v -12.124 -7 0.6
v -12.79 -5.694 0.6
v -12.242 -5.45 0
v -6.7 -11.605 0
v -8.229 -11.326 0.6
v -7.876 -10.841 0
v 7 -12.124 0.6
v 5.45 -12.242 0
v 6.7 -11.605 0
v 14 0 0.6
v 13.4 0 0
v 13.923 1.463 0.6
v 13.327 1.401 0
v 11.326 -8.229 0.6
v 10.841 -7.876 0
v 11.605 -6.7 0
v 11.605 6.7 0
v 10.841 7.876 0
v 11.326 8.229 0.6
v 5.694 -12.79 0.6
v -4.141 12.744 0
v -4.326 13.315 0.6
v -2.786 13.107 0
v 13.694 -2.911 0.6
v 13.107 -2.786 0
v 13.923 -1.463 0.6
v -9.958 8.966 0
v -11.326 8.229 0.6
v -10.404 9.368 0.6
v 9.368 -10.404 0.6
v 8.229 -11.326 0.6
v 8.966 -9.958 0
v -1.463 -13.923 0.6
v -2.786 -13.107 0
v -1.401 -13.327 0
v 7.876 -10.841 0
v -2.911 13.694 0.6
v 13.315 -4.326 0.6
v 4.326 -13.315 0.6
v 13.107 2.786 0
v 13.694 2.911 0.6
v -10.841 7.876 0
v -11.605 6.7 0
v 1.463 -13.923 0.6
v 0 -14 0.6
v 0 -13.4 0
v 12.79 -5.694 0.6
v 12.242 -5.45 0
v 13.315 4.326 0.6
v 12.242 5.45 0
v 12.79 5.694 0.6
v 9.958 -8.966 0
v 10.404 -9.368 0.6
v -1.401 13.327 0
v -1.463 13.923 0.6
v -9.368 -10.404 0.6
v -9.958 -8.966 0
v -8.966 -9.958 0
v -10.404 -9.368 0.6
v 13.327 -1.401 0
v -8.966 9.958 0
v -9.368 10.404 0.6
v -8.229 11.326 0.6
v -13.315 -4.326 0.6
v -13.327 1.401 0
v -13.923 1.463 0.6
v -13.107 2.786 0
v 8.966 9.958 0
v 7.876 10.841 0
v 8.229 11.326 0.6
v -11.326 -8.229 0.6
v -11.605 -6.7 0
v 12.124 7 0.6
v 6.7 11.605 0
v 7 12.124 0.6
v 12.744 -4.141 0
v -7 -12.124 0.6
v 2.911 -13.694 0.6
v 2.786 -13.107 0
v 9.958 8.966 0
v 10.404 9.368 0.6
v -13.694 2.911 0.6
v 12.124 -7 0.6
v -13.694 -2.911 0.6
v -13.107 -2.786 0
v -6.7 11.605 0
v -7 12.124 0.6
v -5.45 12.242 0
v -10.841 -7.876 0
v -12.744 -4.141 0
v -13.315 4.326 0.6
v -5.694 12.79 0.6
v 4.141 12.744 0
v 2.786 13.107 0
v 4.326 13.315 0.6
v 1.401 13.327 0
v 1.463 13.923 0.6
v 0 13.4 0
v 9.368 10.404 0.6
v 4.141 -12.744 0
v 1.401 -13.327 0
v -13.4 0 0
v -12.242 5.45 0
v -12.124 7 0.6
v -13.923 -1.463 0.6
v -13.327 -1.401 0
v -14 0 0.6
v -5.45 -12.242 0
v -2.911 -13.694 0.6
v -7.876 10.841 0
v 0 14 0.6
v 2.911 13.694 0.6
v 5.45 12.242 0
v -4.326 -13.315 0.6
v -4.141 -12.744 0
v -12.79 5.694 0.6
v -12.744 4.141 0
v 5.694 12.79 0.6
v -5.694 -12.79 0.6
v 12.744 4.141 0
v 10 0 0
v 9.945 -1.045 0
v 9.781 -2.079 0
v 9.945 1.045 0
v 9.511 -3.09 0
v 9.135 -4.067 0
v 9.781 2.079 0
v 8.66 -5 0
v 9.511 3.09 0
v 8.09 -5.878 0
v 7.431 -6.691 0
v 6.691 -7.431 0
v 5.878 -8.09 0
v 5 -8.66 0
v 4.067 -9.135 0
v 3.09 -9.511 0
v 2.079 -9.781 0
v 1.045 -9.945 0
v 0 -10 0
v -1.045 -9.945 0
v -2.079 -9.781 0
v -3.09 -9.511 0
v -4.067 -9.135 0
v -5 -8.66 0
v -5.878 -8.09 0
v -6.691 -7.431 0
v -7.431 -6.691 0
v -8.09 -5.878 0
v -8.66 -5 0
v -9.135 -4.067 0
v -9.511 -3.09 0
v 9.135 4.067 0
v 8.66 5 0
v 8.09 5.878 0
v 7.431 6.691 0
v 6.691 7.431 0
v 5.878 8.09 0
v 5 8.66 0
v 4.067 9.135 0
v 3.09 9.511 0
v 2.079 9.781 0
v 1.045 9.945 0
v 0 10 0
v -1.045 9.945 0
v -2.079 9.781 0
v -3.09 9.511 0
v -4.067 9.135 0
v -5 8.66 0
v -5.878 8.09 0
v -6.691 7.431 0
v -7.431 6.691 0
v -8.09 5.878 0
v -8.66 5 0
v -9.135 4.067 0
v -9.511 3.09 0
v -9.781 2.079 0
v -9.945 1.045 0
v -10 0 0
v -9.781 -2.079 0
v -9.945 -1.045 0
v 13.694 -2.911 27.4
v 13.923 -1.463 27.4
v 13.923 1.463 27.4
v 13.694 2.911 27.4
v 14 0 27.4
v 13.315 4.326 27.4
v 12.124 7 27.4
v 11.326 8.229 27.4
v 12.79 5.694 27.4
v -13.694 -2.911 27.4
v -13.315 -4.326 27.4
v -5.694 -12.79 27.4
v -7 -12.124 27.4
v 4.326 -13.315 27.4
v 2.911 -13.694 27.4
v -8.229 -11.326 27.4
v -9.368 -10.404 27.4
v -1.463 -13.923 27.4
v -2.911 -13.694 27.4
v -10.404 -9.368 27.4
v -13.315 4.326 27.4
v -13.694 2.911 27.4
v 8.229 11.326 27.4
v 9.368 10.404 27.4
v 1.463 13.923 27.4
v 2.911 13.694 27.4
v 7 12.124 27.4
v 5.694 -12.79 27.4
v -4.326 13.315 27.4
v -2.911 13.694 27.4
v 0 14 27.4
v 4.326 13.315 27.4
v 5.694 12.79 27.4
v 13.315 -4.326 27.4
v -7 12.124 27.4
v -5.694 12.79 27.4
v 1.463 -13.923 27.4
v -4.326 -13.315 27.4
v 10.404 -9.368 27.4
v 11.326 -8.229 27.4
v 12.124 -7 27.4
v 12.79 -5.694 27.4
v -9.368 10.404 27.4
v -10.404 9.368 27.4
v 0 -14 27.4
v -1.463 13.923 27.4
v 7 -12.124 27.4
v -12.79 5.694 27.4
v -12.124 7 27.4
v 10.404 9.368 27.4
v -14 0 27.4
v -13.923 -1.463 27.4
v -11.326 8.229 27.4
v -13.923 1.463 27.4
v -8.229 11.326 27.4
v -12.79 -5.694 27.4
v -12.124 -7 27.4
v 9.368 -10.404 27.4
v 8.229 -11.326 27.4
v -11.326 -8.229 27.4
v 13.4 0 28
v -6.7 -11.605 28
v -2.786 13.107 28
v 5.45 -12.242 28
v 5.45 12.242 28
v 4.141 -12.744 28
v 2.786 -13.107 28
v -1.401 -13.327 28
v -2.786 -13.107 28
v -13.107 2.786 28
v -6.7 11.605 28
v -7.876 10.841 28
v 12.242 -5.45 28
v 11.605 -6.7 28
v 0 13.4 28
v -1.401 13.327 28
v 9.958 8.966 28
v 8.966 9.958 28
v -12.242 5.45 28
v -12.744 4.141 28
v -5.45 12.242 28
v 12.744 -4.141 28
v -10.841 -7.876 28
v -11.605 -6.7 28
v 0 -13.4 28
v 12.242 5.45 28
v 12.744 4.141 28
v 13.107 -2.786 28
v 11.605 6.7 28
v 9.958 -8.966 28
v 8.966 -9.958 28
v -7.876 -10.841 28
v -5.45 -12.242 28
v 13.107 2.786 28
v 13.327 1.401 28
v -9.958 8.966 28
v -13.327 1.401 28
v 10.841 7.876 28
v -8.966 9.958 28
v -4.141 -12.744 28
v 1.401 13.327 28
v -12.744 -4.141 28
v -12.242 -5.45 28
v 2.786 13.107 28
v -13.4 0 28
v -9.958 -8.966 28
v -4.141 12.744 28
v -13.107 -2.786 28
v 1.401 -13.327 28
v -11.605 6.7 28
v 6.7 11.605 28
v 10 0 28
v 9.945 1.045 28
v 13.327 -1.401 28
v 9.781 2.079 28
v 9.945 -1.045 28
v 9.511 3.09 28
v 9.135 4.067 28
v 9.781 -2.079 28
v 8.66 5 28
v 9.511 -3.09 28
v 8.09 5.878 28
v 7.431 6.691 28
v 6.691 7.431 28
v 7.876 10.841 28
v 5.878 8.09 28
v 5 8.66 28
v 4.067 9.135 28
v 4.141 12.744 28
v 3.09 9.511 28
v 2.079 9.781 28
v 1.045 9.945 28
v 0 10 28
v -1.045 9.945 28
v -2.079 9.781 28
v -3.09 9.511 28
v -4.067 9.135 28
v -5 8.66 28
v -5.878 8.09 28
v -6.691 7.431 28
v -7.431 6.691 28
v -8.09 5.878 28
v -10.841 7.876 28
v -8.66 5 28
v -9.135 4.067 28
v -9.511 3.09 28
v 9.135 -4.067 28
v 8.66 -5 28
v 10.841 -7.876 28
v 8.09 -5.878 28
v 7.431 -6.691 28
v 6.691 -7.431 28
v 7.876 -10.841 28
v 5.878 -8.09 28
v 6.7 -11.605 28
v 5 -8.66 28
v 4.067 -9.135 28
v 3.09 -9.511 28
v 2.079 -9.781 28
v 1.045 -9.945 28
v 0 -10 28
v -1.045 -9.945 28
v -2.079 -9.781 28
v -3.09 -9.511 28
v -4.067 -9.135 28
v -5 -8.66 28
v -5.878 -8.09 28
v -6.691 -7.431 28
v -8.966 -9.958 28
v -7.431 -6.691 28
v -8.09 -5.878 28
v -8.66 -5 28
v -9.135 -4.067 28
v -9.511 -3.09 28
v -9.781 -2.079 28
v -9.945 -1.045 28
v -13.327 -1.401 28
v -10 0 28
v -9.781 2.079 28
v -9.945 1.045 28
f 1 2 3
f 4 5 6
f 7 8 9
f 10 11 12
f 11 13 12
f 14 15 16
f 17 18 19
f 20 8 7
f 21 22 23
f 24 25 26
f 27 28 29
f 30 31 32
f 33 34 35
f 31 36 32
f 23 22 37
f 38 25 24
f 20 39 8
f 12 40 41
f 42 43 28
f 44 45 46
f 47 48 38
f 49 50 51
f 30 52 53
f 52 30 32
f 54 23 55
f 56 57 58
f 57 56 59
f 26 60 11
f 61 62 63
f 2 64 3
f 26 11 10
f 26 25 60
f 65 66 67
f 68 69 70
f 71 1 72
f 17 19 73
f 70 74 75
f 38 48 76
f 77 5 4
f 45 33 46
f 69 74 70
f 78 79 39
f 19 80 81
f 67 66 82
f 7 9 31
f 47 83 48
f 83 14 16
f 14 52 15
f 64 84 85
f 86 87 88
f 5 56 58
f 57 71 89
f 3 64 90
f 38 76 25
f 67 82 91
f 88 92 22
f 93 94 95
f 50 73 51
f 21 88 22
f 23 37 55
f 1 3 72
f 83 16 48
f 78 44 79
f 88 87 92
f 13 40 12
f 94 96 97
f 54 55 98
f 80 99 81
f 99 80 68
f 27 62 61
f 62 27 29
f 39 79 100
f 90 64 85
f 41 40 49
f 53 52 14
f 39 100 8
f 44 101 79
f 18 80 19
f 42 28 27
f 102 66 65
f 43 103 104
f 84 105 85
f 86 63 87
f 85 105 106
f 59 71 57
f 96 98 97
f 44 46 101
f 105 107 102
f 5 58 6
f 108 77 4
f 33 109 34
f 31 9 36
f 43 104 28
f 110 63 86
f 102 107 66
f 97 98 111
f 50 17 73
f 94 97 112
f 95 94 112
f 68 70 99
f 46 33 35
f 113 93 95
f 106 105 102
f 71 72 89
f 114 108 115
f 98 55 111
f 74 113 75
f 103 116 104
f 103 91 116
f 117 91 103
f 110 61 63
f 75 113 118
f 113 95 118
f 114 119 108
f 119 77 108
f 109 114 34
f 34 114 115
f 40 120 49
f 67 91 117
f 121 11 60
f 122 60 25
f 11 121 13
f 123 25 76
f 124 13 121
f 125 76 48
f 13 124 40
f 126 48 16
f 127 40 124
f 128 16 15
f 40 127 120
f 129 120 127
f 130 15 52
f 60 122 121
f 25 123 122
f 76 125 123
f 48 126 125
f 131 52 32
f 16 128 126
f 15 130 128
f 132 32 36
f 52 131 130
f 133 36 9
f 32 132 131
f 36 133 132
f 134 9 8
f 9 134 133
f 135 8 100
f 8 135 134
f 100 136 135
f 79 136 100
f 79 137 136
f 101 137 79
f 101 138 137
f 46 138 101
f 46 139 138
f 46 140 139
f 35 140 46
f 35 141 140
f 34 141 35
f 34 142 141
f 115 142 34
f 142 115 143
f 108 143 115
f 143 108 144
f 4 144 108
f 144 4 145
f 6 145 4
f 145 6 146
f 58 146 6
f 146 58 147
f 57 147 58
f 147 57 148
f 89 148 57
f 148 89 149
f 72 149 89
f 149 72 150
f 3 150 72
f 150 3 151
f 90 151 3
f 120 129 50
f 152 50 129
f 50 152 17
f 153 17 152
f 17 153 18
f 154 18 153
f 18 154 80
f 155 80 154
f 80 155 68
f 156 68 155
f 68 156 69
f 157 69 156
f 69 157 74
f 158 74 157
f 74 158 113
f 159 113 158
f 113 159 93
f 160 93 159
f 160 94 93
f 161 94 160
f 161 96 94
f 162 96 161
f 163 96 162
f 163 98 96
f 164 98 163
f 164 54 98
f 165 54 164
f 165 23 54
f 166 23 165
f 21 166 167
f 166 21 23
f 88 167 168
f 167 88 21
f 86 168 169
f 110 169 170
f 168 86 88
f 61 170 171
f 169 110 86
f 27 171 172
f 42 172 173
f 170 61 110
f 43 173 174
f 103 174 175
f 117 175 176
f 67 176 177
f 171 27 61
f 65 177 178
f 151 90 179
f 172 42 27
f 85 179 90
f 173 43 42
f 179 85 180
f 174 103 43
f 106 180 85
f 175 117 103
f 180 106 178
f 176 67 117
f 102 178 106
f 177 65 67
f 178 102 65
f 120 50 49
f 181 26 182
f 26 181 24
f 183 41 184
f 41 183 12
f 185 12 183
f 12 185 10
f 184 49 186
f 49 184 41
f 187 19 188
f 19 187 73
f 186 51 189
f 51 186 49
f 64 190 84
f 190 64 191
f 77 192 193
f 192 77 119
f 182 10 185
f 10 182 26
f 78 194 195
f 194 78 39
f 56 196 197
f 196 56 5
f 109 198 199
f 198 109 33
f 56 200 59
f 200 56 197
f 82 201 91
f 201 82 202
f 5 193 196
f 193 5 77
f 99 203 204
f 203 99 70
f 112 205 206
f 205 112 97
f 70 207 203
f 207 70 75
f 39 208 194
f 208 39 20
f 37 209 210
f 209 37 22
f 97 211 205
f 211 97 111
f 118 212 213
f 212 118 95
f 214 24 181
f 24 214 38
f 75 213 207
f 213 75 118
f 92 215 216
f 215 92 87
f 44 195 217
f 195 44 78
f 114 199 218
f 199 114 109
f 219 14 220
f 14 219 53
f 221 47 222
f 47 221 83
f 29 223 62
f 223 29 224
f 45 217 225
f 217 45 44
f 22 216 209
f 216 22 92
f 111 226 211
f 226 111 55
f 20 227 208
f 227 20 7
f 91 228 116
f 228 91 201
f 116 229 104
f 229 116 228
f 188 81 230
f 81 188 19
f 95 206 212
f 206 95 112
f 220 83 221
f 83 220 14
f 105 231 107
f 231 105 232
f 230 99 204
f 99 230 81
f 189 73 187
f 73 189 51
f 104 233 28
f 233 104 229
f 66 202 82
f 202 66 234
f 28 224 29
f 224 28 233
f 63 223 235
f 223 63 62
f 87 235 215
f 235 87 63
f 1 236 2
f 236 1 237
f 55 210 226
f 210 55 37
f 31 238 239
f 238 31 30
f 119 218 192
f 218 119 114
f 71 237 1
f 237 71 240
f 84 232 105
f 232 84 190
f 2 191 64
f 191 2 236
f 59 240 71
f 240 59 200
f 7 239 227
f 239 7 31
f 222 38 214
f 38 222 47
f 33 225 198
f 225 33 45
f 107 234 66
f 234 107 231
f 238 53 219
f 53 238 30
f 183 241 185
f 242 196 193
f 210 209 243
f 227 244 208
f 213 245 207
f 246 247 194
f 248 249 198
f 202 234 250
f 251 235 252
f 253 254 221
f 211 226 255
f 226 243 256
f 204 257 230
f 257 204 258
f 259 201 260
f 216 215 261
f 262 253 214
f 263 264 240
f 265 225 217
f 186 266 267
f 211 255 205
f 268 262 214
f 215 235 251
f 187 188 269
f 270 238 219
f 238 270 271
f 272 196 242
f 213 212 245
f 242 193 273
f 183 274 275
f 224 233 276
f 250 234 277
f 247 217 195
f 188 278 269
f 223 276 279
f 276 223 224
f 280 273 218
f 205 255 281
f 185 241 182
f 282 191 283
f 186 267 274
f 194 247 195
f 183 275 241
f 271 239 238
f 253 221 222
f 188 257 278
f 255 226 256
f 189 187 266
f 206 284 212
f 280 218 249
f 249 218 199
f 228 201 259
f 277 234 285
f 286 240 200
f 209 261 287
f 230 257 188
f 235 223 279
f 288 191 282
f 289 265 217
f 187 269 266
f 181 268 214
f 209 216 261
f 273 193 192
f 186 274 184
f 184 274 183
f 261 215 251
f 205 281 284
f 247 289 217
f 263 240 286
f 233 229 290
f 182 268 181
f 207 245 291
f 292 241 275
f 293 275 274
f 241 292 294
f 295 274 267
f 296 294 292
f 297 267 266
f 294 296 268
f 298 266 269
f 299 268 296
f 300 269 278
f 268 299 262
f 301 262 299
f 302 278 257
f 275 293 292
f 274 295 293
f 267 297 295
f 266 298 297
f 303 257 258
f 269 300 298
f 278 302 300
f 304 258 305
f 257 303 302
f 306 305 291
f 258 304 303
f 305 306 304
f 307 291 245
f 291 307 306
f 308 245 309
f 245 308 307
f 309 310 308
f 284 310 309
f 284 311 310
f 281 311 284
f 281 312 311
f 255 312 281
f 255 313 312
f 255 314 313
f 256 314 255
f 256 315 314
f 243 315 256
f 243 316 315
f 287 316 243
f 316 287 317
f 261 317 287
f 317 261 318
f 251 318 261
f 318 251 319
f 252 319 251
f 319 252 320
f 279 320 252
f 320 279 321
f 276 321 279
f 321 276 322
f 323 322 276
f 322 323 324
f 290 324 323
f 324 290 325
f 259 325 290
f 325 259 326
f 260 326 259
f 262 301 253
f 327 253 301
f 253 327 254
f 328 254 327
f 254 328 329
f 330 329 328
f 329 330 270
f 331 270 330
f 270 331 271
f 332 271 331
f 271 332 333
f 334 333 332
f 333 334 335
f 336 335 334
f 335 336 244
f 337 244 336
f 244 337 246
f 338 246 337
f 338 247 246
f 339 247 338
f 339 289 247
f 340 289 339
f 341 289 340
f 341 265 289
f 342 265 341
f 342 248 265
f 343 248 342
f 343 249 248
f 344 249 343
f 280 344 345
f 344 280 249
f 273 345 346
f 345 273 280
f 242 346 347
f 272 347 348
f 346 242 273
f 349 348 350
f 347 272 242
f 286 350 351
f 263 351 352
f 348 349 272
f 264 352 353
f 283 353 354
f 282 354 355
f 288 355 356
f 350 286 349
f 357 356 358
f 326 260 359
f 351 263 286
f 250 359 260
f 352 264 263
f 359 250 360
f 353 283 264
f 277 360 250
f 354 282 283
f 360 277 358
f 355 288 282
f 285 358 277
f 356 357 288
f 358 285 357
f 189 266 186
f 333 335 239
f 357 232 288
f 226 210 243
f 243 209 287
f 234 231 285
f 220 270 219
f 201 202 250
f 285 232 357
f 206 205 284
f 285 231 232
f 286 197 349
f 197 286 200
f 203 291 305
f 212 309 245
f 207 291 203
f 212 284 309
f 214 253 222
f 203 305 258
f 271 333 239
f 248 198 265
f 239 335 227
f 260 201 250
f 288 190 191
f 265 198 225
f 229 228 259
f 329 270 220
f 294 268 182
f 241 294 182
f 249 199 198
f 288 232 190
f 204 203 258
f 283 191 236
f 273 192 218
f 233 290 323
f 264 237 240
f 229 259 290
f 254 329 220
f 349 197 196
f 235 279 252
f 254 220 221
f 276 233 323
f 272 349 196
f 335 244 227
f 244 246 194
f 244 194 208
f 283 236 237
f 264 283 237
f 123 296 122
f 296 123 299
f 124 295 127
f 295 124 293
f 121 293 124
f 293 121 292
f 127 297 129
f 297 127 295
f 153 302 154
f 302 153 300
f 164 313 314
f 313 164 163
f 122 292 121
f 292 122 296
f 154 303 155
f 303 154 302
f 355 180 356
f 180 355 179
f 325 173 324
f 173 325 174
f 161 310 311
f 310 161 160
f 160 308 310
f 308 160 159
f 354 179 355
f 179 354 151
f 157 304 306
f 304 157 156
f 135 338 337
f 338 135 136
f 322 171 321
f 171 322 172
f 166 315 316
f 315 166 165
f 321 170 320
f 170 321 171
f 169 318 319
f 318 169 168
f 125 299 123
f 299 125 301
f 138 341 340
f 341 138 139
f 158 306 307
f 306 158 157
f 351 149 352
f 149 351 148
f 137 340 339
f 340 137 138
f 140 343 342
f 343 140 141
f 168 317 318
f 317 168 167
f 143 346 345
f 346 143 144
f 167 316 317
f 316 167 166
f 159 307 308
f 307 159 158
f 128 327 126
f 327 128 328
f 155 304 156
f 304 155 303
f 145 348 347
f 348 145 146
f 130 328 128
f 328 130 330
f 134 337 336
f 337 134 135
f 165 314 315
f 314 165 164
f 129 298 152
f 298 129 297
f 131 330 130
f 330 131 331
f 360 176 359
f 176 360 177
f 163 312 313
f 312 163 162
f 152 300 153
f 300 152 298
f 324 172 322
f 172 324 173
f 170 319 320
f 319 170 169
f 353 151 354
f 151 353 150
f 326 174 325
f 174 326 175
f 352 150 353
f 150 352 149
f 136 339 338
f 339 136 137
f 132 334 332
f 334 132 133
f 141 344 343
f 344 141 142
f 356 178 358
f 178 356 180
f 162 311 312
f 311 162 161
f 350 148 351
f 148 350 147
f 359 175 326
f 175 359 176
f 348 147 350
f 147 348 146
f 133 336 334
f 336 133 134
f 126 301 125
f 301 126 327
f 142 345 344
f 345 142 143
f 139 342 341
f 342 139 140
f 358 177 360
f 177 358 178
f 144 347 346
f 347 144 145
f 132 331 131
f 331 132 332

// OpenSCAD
// Plain sleeve bushing.
$fn = 60;
eps = 0.02;
inner_d = 20;
outer_d = 28;
length = 28;
chamfer = 0.6;
difference() {
    union() {
        cylinder(d1 = outer_d - 2 * chamfer, d2 = outer_d, h = chamfer);
        translate([0, 0, chamfer]) cylinder(d = outer_d, h = length - 2 * chamfer);
        translate([0, 0, length - chamfer]) cylinder(d1 = outer_d, d2 = outer_d - 2 * chamfer, h = chamfer);
    }
    translate([0, 0, -eps]) cylinder(d = inner_d, h = length + 2 * eps);
}
